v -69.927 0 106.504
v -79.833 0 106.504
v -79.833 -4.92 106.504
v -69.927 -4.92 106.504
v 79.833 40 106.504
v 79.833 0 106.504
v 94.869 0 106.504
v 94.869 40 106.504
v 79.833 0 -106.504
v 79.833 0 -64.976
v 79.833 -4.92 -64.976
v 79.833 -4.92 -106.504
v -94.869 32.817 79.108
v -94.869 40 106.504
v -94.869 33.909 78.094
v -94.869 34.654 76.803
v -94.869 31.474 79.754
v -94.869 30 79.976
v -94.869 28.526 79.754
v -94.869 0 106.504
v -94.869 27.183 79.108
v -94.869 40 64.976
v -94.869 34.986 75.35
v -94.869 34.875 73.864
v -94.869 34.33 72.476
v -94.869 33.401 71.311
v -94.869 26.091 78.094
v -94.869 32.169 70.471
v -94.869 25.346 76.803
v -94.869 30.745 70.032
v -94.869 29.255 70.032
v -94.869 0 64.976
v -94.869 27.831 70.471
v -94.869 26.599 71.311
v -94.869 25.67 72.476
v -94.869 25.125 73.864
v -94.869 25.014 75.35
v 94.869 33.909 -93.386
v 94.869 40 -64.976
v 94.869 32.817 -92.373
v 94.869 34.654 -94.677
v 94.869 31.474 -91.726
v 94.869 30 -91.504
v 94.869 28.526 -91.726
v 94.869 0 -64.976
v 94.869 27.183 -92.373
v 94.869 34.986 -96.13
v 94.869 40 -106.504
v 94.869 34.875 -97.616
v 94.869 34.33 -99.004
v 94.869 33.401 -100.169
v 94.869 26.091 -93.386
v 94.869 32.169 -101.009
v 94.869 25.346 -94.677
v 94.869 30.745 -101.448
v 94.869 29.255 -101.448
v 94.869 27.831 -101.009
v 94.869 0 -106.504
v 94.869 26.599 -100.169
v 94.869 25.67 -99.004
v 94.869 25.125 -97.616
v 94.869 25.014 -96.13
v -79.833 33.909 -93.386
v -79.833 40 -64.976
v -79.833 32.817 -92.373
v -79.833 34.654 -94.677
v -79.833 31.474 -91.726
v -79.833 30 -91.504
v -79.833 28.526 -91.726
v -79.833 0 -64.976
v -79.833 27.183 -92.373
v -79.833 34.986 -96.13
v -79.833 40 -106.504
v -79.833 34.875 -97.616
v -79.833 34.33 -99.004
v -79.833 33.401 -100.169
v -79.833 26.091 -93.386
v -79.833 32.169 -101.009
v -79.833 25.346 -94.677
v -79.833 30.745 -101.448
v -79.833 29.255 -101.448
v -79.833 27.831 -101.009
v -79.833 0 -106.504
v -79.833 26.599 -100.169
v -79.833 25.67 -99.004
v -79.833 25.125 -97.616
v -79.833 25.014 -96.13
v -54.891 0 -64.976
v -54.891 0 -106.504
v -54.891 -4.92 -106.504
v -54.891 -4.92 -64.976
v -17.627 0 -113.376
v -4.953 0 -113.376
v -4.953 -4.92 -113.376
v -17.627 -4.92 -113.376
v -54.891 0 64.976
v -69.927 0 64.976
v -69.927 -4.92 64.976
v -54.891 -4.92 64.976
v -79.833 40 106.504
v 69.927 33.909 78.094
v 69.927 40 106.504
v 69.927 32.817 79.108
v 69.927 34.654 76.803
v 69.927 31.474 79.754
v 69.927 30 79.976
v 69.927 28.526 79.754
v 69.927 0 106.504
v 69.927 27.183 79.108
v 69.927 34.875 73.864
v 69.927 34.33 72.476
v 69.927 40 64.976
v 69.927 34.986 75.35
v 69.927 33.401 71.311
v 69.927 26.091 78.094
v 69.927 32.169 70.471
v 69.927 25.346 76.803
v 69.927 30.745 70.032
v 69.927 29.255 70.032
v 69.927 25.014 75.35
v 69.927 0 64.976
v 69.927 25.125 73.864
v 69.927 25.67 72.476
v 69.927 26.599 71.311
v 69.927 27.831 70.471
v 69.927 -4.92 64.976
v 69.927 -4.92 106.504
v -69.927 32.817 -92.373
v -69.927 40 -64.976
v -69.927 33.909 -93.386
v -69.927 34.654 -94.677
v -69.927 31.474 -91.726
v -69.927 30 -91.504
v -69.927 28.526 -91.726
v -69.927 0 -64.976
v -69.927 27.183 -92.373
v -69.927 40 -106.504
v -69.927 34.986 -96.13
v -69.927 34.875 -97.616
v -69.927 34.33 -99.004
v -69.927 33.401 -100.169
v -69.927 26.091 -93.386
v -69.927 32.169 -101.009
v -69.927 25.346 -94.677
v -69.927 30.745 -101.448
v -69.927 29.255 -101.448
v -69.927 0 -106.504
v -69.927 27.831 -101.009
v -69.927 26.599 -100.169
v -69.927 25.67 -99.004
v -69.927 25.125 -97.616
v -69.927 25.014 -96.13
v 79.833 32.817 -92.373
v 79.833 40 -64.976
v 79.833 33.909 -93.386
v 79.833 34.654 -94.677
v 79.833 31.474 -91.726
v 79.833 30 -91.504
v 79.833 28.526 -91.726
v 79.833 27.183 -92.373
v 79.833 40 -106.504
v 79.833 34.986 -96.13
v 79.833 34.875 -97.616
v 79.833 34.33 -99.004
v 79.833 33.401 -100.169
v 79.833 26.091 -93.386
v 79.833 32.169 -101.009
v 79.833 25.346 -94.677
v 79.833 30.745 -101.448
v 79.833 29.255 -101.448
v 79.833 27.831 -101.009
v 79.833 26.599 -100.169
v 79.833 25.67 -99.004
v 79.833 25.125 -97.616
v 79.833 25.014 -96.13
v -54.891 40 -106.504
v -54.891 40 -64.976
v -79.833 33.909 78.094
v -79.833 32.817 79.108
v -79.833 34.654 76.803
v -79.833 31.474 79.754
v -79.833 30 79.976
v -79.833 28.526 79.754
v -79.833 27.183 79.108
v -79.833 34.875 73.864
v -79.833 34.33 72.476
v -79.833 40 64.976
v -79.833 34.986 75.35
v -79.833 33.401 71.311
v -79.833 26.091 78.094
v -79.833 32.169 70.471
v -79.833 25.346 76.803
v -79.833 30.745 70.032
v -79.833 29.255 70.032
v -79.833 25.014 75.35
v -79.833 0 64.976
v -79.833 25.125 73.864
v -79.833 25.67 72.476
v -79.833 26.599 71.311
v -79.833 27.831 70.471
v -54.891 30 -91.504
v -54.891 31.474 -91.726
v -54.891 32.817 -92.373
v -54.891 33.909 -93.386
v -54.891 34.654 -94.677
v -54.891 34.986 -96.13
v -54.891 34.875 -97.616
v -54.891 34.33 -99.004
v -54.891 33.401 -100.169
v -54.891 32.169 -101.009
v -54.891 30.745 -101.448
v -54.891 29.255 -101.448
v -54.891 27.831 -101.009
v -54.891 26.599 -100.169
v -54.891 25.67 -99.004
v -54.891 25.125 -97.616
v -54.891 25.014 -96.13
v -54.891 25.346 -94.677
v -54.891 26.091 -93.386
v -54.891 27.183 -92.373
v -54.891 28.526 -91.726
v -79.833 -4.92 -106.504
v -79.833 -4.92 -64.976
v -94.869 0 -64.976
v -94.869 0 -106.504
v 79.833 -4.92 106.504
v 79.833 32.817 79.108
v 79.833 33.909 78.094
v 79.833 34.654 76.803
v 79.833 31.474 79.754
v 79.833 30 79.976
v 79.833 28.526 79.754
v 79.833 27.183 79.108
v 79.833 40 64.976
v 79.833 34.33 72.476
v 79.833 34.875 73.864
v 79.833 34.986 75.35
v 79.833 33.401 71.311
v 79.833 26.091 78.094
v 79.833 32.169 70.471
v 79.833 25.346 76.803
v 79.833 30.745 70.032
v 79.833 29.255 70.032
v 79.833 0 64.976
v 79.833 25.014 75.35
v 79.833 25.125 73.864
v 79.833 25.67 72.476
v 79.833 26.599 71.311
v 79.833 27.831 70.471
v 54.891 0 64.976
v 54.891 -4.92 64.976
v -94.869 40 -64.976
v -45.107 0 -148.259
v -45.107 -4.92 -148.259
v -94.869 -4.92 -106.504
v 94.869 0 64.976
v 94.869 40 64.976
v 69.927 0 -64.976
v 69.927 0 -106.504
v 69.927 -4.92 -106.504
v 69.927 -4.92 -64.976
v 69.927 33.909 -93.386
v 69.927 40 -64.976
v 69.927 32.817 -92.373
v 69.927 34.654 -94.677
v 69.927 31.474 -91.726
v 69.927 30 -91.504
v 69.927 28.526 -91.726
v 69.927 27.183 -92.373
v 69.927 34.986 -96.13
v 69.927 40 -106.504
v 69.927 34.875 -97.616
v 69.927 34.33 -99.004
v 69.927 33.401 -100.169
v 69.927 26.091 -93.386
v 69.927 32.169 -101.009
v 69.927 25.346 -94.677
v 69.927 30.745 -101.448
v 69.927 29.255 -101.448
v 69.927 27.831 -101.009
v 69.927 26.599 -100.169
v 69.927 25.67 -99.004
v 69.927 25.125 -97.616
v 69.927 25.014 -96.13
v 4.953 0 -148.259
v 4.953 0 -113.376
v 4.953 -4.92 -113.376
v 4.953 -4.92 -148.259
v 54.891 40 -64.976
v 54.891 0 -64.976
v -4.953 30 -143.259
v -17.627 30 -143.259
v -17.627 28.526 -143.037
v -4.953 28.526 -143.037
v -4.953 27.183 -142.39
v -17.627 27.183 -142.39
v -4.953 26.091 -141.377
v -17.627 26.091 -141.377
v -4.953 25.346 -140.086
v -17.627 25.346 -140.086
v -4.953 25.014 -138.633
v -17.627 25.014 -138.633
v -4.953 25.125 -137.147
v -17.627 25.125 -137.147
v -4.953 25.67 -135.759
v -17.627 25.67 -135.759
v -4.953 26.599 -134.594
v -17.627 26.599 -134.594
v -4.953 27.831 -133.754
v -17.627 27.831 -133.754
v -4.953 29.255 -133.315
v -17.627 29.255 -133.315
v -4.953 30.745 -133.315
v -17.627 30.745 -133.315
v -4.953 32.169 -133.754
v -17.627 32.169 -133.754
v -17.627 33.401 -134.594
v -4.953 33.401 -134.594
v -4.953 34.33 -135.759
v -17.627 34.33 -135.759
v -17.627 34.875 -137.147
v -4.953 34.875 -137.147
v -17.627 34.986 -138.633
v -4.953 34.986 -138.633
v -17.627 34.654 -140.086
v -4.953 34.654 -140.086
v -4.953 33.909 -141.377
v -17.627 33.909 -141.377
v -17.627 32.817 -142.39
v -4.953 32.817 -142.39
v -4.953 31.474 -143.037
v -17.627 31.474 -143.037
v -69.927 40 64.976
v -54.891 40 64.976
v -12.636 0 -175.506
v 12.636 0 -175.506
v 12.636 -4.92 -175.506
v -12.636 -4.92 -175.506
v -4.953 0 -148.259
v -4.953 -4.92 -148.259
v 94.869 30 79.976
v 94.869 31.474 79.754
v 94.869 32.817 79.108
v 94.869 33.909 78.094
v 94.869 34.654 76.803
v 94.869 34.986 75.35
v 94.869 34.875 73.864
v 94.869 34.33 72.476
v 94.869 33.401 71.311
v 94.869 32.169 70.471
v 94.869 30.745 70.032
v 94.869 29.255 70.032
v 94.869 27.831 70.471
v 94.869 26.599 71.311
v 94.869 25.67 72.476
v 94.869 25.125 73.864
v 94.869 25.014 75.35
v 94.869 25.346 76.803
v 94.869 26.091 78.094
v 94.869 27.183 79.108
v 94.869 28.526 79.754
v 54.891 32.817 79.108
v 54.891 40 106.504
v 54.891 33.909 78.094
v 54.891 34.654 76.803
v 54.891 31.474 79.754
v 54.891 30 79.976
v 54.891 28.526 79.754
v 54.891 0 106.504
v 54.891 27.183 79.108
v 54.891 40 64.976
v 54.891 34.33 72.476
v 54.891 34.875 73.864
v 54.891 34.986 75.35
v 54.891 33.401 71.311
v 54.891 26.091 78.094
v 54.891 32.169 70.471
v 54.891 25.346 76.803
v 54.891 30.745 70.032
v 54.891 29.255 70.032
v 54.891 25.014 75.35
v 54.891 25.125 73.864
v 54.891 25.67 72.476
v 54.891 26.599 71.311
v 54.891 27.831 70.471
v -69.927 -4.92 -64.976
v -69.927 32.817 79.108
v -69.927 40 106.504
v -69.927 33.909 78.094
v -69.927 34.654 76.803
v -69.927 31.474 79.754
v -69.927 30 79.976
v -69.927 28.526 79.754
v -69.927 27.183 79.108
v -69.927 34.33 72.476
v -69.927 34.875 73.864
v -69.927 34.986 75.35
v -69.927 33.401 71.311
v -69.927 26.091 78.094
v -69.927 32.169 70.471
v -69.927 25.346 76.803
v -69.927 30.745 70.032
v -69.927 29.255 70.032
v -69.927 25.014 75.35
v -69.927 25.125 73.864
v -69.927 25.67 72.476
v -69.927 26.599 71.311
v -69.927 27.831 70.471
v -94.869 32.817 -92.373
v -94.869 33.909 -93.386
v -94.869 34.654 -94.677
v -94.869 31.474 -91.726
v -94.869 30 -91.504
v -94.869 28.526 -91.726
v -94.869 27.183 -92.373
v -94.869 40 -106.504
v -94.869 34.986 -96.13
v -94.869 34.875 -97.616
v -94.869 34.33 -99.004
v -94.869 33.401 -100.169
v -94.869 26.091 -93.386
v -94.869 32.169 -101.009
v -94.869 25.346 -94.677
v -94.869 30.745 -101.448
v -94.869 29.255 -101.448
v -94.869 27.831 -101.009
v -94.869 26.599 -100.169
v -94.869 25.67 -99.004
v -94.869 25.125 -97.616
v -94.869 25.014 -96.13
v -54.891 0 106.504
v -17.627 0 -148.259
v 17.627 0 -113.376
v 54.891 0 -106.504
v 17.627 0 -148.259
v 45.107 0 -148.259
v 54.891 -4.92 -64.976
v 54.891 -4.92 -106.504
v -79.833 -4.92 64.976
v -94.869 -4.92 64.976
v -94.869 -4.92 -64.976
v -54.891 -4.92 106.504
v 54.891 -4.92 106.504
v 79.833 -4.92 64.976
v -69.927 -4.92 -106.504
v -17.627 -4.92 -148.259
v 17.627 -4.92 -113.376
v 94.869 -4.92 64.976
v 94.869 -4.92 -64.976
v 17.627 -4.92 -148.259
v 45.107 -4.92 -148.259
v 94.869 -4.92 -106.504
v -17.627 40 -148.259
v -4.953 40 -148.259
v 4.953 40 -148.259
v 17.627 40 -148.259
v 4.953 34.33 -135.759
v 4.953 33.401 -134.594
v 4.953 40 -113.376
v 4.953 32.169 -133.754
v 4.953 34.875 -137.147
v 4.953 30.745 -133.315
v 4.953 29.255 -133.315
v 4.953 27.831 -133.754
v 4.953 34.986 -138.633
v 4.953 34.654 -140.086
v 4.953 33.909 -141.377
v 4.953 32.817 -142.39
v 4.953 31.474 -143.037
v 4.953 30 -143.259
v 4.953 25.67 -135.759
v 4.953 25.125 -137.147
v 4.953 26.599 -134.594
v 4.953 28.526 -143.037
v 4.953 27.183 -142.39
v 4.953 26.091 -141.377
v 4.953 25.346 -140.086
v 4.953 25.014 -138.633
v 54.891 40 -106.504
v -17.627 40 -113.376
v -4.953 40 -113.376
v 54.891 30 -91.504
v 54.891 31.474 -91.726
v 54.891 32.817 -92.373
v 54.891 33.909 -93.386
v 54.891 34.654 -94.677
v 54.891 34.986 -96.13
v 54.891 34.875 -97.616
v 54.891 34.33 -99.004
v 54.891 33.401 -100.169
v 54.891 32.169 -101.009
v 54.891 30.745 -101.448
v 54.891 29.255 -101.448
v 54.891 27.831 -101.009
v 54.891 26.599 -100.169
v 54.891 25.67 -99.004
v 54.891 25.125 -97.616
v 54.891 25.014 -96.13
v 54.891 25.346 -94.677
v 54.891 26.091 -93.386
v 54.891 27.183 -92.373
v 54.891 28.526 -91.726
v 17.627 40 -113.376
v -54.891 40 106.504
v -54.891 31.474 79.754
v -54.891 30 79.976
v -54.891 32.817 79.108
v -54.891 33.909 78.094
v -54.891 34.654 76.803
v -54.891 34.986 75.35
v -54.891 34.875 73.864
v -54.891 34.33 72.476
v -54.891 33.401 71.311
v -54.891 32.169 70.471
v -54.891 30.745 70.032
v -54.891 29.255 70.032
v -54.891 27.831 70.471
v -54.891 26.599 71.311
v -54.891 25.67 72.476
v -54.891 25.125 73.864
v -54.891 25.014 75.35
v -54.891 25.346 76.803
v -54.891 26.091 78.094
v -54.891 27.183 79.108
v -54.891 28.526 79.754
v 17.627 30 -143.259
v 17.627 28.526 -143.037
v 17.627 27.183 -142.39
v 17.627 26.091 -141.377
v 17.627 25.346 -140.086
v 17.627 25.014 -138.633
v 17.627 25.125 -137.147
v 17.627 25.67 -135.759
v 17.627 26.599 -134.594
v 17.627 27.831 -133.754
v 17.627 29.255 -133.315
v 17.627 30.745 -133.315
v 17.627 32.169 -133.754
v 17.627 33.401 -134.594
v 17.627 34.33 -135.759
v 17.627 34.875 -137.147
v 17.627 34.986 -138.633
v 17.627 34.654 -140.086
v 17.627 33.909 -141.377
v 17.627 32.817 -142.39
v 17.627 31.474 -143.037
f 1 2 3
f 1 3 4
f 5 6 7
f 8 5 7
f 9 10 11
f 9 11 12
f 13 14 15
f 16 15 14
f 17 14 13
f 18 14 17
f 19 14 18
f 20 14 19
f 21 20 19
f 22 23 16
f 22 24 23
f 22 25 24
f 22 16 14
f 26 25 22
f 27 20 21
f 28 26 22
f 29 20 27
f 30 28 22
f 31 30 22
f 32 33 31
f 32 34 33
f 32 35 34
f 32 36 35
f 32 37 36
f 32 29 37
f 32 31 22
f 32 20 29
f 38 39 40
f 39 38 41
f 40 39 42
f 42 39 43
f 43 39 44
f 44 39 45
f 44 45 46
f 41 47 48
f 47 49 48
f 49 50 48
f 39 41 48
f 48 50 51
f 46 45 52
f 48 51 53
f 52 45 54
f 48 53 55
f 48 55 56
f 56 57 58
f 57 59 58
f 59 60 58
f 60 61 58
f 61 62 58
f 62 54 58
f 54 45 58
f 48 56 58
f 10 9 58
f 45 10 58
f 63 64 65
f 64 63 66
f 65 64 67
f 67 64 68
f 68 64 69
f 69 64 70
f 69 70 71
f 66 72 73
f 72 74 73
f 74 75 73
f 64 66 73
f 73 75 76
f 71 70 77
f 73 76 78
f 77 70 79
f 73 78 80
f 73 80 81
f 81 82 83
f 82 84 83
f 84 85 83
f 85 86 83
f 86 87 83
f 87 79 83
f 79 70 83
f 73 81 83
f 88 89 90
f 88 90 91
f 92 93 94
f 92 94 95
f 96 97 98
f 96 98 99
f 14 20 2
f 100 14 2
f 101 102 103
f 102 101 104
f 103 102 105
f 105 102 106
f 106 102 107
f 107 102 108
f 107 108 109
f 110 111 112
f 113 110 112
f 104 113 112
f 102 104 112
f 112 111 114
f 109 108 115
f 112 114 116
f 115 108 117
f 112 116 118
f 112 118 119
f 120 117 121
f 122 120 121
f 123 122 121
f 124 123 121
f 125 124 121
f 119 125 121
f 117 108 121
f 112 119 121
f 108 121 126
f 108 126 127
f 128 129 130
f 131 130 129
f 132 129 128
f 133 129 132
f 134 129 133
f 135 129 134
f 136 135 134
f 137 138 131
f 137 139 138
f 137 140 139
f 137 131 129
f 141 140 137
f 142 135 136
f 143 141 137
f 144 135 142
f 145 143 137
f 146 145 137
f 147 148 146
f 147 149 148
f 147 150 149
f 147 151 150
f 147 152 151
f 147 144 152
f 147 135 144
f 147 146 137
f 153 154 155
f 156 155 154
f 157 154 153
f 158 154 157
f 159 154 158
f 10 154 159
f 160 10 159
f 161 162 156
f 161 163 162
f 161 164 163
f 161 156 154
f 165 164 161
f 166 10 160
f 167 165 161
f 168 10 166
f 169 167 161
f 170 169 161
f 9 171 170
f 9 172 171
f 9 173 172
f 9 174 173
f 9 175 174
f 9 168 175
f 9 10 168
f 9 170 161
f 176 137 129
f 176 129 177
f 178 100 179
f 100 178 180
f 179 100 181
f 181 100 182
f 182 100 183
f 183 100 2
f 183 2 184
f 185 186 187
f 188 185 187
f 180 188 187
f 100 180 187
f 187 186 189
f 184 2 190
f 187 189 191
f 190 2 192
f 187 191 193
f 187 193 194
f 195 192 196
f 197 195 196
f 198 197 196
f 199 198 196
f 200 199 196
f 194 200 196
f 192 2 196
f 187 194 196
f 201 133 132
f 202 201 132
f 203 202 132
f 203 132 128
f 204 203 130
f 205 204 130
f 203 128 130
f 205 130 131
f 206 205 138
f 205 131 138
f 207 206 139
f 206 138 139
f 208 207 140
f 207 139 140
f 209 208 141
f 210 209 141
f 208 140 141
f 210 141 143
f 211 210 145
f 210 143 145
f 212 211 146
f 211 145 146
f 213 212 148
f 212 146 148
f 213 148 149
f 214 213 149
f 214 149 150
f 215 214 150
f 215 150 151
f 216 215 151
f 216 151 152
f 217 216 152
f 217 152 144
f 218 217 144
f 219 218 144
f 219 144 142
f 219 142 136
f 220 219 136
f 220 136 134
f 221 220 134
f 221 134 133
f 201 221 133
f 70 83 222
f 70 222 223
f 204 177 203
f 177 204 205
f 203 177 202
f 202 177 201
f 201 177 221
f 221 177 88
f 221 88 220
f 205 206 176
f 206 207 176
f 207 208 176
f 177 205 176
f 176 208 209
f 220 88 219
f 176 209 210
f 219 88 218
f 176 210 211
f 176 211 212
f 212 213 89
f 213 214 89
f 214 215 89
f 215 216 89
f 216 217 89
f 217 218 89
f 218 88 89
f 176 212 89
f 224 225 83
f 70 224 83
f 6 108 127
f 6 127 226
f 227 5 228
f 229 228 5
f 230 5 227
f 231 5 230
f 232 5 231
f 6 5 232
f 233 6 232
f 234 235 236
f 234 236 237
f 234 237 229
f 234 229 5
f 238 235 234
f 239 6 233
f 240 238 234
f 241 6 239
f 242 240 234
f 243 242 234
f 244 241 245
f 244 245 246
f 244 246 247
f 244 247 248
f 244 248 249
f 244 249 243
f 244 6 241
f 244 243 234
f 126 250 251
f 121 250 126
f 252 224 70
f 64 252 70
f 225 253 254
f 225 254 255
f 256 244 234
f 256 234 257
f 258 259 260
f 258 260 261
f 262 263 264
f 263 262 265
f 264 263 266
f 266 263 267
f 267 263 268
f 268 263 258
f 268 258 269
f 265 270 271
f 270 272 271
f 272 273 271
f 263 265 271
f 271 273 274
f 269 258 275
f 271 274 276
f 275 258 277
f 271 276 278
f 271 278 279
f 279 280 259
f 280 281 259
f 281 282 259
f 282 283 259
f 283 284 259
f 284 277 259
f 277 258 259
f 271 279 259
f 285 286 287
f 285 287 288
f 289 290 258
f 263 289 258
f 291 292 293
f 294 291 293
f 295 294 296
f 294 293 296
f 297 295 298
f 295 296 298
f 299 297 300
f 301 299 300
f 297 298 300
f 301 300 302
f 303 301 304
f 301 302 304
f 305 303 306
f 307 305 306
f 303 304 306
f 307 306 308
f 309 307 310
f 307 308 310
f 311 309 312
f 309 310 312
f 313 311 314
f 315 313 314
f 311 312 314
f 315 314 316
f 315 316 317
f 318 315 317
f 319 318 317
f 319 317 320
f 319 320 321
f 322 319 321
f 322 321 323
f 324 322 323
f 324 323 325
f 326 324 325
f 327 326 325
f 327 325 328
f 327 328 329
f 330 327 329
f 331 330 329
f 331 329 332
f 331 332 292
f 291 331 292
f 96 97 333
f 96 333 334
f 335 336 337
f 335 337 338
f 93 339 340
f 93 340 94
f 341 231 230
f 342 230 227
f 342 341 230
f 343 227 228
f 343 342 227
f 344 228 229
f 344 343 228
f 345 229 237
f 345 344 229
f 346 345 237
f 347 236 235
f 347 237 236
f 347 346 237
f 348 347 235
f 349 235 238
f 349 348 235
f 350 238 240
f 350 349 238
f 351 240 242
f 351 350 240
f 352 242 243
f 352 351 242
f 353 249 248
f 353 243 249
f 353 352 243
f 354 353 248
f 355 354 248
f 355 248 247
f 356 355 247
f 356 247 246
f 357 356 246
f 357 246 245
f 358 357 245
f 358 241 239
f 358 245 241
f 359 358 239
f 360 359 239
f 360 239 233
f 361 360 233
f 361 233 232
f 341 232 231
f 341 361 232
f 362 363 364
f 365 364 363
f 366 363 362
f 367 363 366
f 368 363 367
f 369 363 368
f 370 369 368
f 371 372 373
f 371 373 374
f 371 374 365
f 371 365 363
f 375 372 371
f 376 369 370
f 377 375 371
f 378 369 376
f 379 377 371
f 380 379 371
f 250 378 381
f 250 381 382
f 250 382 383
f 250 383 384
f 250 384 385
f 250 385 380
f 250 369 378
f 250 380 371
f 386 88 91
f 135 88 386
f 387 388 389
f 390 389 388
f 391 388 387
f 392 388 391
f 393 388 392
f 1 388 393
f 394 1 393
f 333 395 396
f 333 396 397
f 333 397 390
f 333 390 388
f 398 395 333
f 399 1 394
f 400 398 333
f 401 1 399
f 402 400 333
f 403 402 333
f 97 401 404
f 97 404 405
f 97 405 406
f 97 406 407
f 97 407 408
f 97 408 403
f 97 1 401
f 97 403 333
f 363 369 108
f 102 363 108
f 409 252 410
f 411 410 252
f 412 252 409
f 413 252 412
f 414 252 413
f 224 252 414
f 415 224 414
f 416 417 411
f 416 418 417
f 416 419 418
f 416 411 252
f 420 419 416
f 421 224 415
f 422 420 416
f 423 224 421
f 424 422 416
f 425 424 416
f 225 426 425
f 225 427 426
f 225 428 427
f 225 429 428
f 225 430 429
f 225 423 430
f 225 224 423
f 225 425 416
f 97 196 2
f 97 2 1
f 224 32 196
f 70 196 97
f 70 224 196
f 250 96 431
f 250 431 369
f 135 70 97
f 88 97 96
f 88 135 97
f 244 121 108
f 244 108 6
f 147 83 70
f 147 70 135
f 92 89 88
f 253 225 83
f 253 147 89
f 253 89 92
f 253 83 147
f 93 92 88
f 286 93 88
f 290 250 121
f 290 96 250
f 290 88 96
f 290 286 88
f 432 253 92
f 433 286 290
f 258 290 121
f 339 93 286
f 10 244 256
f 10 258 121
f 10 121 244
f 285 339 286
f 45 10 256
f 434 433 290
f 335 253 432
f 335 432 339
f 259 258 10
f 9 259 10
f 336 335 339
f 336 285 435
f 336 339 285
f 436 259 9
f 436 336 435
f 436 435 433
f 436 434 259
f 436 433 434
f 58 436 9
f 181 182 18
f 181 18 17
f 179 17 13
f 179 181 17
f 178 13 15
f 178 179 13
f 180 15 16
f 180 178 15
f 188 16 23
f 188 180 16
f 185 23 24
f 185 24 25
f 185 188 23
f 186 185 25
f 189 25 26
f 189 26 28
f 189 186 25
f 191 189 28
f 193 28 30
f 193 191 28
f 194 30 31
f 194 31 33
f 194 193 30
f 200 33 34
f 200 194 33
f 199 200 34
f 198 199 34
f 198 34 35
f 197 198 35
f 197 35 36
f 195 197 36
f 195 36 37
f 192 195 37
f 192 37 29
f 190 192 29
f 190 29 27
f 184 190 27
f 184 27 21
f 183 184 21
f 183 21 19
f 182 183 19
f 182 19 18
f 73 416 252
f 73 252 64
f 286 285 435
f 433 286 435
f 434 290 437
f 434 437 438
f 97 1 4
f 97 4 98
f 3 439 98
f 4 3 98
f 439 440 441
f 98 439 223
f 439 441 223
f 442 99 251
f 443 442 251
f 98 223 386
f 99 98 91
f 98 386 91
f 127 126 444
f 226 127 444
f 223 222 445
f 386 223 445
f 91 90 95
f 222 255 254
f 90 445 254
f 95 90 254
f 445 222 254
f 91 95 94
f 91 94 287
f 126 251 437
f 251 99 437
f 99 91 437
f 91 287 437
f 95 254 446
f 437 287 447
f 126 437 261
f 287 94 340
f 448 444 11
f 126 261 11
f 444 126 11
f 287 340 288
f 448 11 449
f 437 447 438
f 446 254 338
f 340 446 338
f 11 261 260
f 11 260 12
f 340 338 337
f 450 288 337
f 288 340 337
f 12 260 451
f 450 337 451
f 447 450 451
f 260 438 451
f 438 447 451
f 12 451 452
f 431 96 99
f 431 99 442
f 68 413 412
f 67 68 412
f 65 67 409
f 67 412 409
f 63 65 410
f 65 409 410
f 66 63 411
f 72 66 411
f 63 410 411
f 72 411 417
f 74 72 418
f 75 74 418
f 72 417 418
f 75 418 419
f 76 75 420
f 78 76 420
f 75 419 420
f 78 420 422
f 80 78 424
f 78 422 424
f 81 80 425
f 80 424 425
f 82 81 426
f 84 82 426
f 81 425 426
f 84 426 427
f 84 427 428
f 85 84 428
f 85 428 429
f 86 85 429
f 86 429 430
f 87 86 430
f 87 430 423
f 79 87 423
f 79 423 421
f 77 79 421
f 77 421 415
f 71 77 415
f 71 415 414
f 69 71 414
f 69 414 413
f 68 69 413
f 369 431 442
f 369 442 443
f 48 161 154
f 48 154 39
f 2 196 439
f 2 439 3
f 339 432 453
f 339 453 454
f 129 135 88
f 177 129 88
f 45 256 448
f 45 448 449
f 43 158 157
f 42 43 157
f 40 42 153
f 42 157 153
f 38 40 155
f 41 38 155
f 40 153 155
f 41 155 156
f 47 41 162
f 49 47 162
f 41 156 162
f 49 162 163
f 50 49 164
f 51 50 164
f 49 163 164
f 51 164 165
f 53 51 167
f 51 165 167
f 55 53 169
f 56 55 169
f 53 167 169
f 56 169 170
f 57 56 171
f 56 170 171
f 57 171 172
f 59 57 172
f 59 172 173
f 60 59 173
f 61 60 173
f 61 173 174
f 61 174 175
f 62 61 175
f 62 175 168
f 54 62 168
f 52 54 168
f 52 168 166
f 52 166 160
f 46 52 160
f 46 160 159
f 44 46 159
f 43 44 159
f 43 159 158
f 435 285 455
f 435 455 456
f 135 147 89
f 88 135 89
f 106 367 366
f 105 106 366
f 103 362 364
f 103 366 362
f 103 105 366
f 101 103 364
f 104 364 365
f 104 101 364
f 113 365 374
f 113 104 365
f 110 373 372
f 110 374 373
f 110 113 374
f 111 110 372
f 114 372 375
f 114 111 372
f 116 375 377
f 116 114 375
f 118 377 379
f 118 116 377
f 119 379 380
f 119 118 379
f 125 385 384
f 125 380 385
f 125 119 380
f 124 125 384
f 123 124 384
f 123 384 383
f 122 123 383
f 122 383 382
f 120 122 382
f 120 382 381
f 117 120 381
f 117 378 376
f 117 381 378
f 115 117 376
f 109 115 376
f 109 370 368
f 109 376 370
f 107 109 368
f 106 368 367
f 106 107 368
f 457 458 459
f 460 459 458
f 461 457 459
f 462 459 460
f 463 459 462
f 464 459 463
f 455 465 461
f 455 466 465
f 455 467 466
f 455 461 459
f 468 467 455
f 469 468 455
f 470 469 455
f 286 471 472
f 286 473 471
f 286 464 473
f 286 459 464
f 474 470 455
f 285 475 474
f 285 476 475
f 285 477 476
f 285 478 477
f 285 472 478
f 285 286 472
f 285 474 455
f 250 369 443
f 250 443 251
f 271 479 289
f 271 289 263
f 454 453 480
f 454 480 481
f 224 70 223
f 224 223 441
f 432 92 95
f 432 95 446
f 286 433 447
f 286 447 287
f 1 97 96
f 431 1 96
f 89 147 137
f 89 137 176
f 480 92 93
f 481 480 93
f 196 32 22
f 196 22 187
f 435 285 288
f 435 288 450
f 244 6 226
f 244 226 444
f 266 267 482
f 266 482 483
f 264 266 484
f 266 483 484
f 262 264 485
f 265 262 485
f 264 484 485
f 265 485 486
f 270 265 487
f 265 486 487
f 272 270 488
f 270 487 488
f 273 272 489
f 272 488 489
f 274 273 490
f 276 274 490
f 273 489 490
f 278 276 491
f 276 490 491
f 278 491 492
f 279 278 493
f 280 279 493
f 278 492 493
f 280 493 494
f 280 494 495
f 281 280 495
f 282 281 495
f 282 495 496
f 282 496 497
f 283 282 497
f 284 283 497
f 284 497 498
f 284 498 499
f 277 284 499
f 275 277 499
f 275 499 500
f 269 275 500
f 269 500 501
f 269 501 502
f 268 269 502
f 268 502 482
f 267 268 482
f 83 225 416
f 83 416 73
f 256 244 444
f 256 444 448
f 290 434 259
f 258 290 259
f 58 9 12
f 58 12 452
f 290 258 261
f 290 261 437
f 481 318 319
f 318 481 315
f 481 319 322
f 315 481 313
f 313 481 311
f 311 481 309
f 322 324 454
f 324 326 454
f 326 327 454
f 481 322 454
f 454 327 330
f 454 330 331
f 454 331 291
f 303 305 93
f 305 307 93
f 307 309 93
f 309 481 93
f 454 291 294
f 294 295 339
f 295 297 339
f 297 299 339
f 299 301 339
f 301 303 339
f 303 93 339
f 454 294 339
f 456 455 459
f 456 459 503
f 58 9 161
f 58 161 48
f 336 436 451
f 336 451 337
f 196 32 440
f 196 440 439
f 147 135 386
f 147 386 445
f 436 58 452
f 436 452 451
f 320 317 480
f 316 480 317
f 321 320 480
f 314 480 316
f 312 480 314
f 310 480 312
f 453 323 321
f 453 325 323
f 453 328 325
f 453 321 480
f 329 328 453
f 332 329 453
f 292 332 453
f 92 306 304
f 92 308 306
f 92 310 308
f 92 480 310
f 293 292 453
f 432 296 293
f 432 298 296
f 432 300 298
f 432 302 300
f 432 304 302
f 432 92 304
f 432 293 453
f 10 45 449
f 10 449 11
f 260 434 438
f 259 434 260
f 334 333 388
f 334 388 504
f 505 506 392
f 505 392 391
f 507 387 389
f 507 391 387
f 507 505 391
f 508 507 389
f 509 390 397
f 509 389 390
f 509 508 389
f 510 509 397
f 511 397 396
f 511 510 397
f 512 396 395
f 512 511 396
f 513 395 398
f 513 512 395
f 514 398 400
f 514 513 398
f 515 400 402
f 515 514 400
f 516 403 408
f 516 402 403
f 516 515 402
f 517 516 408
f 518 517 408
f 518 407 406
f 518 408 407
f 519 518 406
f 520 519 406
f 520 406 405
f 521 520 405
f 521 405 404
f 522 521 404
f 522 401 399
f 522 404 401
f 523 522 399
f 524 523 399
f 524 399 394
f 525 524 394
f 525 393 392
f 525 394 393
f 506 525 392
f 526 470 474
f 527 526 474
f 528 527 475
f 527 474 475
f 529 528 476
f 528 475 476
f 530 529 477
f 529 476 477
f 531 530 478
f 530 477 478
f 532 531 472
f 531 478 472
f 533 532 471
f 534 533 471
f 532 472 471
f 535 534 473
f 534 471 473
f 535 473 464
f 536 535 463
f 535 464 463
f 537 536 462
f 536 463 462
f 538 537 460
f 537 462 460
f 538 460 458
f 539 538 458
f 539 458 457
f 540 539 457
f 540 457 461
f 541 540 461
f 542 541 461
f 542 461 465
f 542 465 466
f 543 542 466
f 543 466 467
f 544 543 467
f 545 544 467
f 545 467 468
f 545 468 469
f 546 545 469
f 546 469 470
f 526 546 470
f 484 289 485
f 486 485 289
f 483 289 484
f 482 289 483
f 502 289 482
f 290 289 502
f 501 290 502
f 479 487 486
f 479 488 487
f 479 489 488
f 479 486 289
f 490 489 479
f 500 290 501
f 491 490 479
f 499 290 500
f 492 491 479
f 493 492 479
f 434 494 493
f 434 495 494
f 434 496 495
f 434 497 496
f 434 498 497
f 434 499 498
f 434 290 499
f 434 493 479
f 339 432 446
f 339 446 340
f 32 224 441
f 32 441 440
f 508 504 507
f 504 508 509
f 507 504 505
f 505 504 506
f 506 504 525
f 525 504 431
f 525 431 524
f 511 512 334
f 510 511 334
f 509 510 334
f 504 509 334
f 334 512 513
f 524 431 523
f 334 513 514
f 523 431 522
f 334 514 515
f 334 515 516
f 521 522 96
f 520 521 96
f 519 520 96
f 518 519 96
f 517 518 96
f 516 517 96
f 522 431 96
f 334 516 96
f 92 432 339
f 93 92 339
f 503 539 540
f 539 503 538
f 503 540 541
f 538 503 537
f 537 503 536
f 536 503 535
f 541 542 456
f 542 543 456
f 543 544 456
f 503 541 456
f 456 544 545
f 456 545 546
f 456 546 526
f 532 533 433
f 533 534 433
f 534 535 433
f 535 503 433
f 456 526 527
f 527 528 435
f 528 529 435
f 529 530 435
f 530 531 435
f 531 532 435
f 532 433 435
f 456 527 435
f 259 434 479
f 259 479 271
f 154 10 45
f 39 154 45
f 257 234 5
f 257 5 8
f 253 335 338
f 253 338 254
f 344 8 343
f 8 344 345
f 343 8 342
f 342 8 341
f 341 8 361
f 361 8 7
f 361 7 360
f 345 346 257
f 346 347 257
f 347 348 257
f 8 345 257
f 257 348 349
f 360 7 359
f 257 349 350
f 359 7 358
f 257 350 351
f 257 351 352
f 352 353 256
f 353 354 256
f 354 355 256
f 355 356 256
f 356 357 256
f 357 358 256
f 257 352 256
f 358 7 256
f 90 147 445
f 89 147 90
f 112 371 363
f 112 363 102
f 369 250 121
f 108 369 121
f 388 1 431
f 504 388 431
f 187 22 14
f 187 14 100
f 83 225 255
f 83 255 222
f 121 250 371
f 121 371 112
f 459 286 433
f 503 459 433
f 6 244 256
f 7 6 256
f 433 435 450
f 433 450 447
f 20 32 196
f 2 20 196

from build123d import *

# Parameters (mm, degrees)
SKETCH3_W              = 12.673843353
SKETCH3_H              = 34.882924186
BOSS_EXTRUDE1_DEPTH    = 40
SKETCH3_W_2            = 15.035841509
SKETCH3_H_2            = 41.527562264
BOSS_EXTRUDE1_2_DEPTH  = 40
SKETCH3_W_3            = 15.03584151
BOSS_EXTRUDE1_3_DEPTH  = 40
BOSS_EXTRUDE1_4_DEPTH  = 40
BOSS_EXTRUDE1_5_DEPTH  = 40
BOSS_EXTRUDE1_6_DEPTH  = 40
BOSS_EXTRUDE1_7_DEPTH  = 40
BOSS_EXTRUDE1_8_DEPTH  = 40
BOSS_EXTRUDE1_9_DEPTH  = 40
BOSS_EXTRUDE1_10_DEPTH = 40
BOSS_EXTRUDE3_DEPTH    = 4.92
CUT_EXTRUDE1_START     = -189.738
SKETCH6_R              = 5
CUT_EXTRUDE1_DEPTH     = 189.738
SKETCH5_R              = 5
CUT_EXTRUDE2_DEPTH     = 203.294
SKETCH4_R              = 5
CUT_EXTRUDE3_DEPTH     = 203.294


with BuildPart() as part:
    # Sketch3 → Boss-Extrude1 (new body)
    with BuildSketch(Plane(origin=(0, 0, 0), x_dir=(1, 0, 0), z_dir=(0, 1, 0))):
        with Locations((-11.289921677, 130.817819602)):
            Rectangle(SKETCH3_W, SKETCH3_H)
    extrude(amount=BOSS_EXTRUDE1_DEPTH)


with BuildPart() as body_2:
    # Sketch3 → Boss-Extrude1 2 (new body)
    with BuildSketch(Plane(origin=(0, 0, 0), x_dir=(1, 0, 0), z_dir=(0, 1, 0))):
        with Locations((-87.351079246, 85.740096226)):
            Rectangle(SKETCH3_W_2, SKETCH3_H_2)
    extrude(amount=BOSS_EXTRUDE1_2_DEPTH)


with BuildPart() as body_3:
    # Sketch3 → Boss-Extrude1 3 (new body)
    with BuildSketch(Plane(origin=(0, 0, 0), x_dir=(1, 0, 0), z_dir=(0, 1, 0))):
        with Locations((-62.409237736, 85.740096226)):
            Rectangle(SKETCH3_W_3, SKETCH3_H_2)
    extrude(amount=BOSS_EXTRUDE1_3_DEPTH)


with BuildPart() as body_4:
    # Sketch3 → Boss-Extrude1 4 (new body)
    with BuildSketch(Plane(origin=(0, 0, 0), x_dir=(1, 0, 0), z_dir=(0, 1, 0))):
        with Locations((62.409237736, 85.740096226)):
            Rectangle(SKETCH3_W_3, SKETCH3_H_2)
    extrude(amount=BOSS_EXTRUDE1_4_DEPTH)


with BuildPart() as body_5:
    # Sketch3 → Boss-Extrude1 5 (new body)
    with BuildSketch(Plane(origin=(0, 0, 0), x_dir=(1, 0, 0), z_dir=(0, 1, 0))):
        with Locations((87.351079246, 85.740096226)):
            Rectangle(SKETCH3_W_2, SKETCH3_H_2)
    extrude(amount=BOSS_EXTRUDE1_5_DEPTH)


with BuildPart() as body_6:
    # Sketch3 → Boss-Extrude1 6 (new body)
    with BuildSketch(Plane(origin=(0, 0, 0), x_dir=(1, 0, 0), z_dir=(0, 1, 0))):
        with Locations((-87.351079246, -85.740096226)):
            Rectangle(SKETCH3_W_2, SKETCH3_H_2)
    extrude(amount=BOSS_EXTRUDE1_6_DEPTH)


with BuildPart() as body_7:
    # Sketch3 → Boss-Extrude1 7 (new body)
    with BuildSketch(Plane(origin=(0, 0, 0), x_dir=(1, 0, 0), z_dir=(0, 1, 0))):
        with Locations((-62.409237736, -85.740096226)):
            Rectangle(SKETCH3_W_3, SKETCH3_H_2)
    extrude(amount=BOSS_EXTRUDE1_7_DEPTH)


with BuildPart() as body_8:
    # Sketch3 → Boss-Extrude1 8 (new body)
    with BuildSketch(Plane(origin=(0, 0, 0), x_dir=(1, 0, 0), z_dir=(0, 1, 0))):
        with Locations((62.409237736, -85.740096226)):
            Rectangle(SKETCH3_W_3, SKETCH3_H_2)
    extrude(amount=BOSS_EXTRUDE1_8_DEPTH)


with BuildPart() as body_9:
    # Sketch3 → Boss-Extrude1 9 (new body)
    with BuildSketch(Plane(origin=(0, 0, 0), x_dir=(1, 0, 0), z_dir=(0, 1, 0))):
        with Locations((87.351079246, -85.740096226)):
            Rectangle(SKETCH3_W_2, SKETCH3_H_2)
    extrude(amount=BOSS_EXTRUDE1_9_DEPTH)


with BuildPart() as body_10:
    # Sketch3 → Boss-Extrude1 10 (new body)
    with BuildSketch(Plane(origin=(0, 0, 0), x_dir=(1, 0, 0), z_dir=(0, 1, 0))):
        with Locations((11.289921677, 130.817819602)):
            Rectangle(SKETCH3_W, SKETCH3_H)
    extrude(amount=BOSS_EXTRUDE1_10_DEPTH)


with BuildPart() as body_11:
    # Sketch3<5> → Boss-Extrude3 (new body)
    with BuildSketch(Plane(origin=(0, 0, 0), x_dir=(1, 0, 0), z_dir=(0, 1, 0))):
        Polygon((74.880158491, -106.503877358), (79.833158491, -106.503877358), (79.833158491, -64.976315094), (94.869, -64.976315094), (94.869, 64.976315094), (79.833158491, 64.976315094), (79.833158491, 106.503877358), (69.927158491, 106.503877358), (69.927158491, 64.976315094), (54.891316981, 64.976315094), (54.891316981, 106.503877358), (-54.891316981, 106.503877358), (-54.891316981, 64.976315094), (-69.927158491, 64.976315094), (-69.927158491, 106.503877358), (-79.833158491, 106.503877358), (-79.833158491, 64.976315094), (-94.869, 64.976315094), (-94.869, -64.976315094), (-79.833158491, -64.976315094), (-79.833158491, -106.503877358), (-74.880158491, -106.503877358), (-69.927158491, -106.503877358), (-69.927158491, -64.976315094), (-54.891316981, -64.976315094), (-54.891316981, -106.503877358), (54.891316981, -106.503877358), (54.891316981, -64.976315094), (69.927158491, -64.976315094), (69.927158491, -106.503877358), align=None)
        Polygon((79.833158491, 106.503877358), (94.869, 106.503877358), (45.106846872, 148.259281695), (17.626843353, 148.259281695), (17.626843353, 113.376357509), (4.953, 113.376357509), (4.953, 148.259281695), (-4.953, 148.259281695), (-4.953, 113.376357509), (-17.626843353, 113.376357509), (-17.626843353, 148.259281695), (-45.106846872, 148.259281695), (-94.869, 106.503877358), (-79.833158491, 106.503877358), (-69.927158491, 106.503877358), (-54.891316981, 106.503877358), (54.891316981, 106.503877358), (69.927158491, 106.503877358), align=None)
        Polygon((17.626843353, 148.259281695), (45.106846872, 148.259281695), (12.635755252, 175.505762697), (-12.635755252, 175.505762697), (-45.106846872, 148.259281695), (-17.626843353, 148.259281695), (-4.953, 148.259281695), (4.953, 148.259281695), align=None)
    extrude(amount=-BOSS_EXTRUDE3_DEPTH)


with BuildPart() as cut_extrude1_tool:
    # Sketch6 → Cut-Extrude1 (new body)
    with BuildSketch(Plane.ZY.offset(94.869).offset(CUT_EXTRUDE1_START)):
        with Locations((74.976315094, 30)):
            Circle(SKETCH6_R)
    extrude(amount=CUT_EXTRUDE1_DEPTH)


with BuildPart() as body_6_1:
    add(body_6.part)

    # Cut-Extrude1: cut by cut_extrude1_tool
    add(cut_extrude1_tool.part, mode=Mode.SUBTRACT)


with BuildPart() as body_7_1:
    add(body_7.part)

    # Cut-Extrude1: cut by cut_extrude1_tool
    add(cut_extrude1_tool.part, mode=Mode.SUBTRACT)


with BuildPart() as body_8_1:
    add(body_8.part)

    # Cut-Extrude1: cut by cut_extrude1_tool
    add(cut_extrude1_tool.part, mode=Mode.SUBTRACT)


with BuildPart() as body_9_1:
    add(body_9.part)

    # Cut-Extrude1: cut by cut_extrude1_tool
    add(cut_extrude1_tool.part, mode=Mode.SUBTRACT)


with BuildPart() as cut_extrude2_tool:
    # Sketch5 → Cut-Extrude2 (new body)
    with BuildSketch(Plane.ZY.offset(17.626843353)):
        with Locations(Location((-138.259281695, 30, 0), (0, 0, 180))):
            Circle(SKETCH5_R)
    extrude(amount=-CUT_EXTRUDE2_DEPTH)


with BuildPart() as part_1:
    add(part.part)

    # Cut-Extrude2: cut by cut_extrude2_tool
    add(cut_extrude2_tool.part, mode=Mode.SUBTRACT)


with BuildPart() as body_10_1:
    add(body_10.part)

    # Cut-Extrude2: cut by cut_extrude2_tool
    add(cut_extrude2_tool.part, mode=Mode.SUBTRACT)


with BuildPart() as cut_extrude3_tool:
    # Sketch4 → Cut-Extrude3 (new body)
    with BuildSketch(Plane.ZY.offset(94.869)):
        with Locations((-96.503877358, 30)):
            Circle(SKETCH4_R)
    extrude(amount=-CUT_EXTRUDE3_DEPTH)


with BuildPart() as body_2_1:
    add(body_2.part)

    # Cut-Extrude3: cut by cut_extrude3_tool
    add(cut_extrude3_tool.part, mode=Mode.SUBTRACT)


with BuildPart() as body_3_1:
    add(body_3.part)

    # Cut-Extrude3: cut by cut_extrude3_tool
    add(cut_extrude3_tool.part, mode=Mode.SUBTRACT)


with BuildPart() as body_4_1:
    add(body_4.part)

    # Cut-Extrude3: cut by cut_extrude3_tool
    add(cut_extrude3_tool.part, mode=Mode.SUBTRACT)


with BuildPart() as body_5_1:
    add(body_5.part)

    # Cut-Extrude3: cut by cut_extrude3_tool
    add(cut_extrude3_tool.part, mode=Mode.SUBTRACT)


solid = Compound([body_11.part, body_6_1.part, body_7_1.part, body_8_1.part, body_9_1.part, part_1.part, body_10_1.part, body_2_1.part, body_3_1.part, body_4_1.part, body_5_1.part])
